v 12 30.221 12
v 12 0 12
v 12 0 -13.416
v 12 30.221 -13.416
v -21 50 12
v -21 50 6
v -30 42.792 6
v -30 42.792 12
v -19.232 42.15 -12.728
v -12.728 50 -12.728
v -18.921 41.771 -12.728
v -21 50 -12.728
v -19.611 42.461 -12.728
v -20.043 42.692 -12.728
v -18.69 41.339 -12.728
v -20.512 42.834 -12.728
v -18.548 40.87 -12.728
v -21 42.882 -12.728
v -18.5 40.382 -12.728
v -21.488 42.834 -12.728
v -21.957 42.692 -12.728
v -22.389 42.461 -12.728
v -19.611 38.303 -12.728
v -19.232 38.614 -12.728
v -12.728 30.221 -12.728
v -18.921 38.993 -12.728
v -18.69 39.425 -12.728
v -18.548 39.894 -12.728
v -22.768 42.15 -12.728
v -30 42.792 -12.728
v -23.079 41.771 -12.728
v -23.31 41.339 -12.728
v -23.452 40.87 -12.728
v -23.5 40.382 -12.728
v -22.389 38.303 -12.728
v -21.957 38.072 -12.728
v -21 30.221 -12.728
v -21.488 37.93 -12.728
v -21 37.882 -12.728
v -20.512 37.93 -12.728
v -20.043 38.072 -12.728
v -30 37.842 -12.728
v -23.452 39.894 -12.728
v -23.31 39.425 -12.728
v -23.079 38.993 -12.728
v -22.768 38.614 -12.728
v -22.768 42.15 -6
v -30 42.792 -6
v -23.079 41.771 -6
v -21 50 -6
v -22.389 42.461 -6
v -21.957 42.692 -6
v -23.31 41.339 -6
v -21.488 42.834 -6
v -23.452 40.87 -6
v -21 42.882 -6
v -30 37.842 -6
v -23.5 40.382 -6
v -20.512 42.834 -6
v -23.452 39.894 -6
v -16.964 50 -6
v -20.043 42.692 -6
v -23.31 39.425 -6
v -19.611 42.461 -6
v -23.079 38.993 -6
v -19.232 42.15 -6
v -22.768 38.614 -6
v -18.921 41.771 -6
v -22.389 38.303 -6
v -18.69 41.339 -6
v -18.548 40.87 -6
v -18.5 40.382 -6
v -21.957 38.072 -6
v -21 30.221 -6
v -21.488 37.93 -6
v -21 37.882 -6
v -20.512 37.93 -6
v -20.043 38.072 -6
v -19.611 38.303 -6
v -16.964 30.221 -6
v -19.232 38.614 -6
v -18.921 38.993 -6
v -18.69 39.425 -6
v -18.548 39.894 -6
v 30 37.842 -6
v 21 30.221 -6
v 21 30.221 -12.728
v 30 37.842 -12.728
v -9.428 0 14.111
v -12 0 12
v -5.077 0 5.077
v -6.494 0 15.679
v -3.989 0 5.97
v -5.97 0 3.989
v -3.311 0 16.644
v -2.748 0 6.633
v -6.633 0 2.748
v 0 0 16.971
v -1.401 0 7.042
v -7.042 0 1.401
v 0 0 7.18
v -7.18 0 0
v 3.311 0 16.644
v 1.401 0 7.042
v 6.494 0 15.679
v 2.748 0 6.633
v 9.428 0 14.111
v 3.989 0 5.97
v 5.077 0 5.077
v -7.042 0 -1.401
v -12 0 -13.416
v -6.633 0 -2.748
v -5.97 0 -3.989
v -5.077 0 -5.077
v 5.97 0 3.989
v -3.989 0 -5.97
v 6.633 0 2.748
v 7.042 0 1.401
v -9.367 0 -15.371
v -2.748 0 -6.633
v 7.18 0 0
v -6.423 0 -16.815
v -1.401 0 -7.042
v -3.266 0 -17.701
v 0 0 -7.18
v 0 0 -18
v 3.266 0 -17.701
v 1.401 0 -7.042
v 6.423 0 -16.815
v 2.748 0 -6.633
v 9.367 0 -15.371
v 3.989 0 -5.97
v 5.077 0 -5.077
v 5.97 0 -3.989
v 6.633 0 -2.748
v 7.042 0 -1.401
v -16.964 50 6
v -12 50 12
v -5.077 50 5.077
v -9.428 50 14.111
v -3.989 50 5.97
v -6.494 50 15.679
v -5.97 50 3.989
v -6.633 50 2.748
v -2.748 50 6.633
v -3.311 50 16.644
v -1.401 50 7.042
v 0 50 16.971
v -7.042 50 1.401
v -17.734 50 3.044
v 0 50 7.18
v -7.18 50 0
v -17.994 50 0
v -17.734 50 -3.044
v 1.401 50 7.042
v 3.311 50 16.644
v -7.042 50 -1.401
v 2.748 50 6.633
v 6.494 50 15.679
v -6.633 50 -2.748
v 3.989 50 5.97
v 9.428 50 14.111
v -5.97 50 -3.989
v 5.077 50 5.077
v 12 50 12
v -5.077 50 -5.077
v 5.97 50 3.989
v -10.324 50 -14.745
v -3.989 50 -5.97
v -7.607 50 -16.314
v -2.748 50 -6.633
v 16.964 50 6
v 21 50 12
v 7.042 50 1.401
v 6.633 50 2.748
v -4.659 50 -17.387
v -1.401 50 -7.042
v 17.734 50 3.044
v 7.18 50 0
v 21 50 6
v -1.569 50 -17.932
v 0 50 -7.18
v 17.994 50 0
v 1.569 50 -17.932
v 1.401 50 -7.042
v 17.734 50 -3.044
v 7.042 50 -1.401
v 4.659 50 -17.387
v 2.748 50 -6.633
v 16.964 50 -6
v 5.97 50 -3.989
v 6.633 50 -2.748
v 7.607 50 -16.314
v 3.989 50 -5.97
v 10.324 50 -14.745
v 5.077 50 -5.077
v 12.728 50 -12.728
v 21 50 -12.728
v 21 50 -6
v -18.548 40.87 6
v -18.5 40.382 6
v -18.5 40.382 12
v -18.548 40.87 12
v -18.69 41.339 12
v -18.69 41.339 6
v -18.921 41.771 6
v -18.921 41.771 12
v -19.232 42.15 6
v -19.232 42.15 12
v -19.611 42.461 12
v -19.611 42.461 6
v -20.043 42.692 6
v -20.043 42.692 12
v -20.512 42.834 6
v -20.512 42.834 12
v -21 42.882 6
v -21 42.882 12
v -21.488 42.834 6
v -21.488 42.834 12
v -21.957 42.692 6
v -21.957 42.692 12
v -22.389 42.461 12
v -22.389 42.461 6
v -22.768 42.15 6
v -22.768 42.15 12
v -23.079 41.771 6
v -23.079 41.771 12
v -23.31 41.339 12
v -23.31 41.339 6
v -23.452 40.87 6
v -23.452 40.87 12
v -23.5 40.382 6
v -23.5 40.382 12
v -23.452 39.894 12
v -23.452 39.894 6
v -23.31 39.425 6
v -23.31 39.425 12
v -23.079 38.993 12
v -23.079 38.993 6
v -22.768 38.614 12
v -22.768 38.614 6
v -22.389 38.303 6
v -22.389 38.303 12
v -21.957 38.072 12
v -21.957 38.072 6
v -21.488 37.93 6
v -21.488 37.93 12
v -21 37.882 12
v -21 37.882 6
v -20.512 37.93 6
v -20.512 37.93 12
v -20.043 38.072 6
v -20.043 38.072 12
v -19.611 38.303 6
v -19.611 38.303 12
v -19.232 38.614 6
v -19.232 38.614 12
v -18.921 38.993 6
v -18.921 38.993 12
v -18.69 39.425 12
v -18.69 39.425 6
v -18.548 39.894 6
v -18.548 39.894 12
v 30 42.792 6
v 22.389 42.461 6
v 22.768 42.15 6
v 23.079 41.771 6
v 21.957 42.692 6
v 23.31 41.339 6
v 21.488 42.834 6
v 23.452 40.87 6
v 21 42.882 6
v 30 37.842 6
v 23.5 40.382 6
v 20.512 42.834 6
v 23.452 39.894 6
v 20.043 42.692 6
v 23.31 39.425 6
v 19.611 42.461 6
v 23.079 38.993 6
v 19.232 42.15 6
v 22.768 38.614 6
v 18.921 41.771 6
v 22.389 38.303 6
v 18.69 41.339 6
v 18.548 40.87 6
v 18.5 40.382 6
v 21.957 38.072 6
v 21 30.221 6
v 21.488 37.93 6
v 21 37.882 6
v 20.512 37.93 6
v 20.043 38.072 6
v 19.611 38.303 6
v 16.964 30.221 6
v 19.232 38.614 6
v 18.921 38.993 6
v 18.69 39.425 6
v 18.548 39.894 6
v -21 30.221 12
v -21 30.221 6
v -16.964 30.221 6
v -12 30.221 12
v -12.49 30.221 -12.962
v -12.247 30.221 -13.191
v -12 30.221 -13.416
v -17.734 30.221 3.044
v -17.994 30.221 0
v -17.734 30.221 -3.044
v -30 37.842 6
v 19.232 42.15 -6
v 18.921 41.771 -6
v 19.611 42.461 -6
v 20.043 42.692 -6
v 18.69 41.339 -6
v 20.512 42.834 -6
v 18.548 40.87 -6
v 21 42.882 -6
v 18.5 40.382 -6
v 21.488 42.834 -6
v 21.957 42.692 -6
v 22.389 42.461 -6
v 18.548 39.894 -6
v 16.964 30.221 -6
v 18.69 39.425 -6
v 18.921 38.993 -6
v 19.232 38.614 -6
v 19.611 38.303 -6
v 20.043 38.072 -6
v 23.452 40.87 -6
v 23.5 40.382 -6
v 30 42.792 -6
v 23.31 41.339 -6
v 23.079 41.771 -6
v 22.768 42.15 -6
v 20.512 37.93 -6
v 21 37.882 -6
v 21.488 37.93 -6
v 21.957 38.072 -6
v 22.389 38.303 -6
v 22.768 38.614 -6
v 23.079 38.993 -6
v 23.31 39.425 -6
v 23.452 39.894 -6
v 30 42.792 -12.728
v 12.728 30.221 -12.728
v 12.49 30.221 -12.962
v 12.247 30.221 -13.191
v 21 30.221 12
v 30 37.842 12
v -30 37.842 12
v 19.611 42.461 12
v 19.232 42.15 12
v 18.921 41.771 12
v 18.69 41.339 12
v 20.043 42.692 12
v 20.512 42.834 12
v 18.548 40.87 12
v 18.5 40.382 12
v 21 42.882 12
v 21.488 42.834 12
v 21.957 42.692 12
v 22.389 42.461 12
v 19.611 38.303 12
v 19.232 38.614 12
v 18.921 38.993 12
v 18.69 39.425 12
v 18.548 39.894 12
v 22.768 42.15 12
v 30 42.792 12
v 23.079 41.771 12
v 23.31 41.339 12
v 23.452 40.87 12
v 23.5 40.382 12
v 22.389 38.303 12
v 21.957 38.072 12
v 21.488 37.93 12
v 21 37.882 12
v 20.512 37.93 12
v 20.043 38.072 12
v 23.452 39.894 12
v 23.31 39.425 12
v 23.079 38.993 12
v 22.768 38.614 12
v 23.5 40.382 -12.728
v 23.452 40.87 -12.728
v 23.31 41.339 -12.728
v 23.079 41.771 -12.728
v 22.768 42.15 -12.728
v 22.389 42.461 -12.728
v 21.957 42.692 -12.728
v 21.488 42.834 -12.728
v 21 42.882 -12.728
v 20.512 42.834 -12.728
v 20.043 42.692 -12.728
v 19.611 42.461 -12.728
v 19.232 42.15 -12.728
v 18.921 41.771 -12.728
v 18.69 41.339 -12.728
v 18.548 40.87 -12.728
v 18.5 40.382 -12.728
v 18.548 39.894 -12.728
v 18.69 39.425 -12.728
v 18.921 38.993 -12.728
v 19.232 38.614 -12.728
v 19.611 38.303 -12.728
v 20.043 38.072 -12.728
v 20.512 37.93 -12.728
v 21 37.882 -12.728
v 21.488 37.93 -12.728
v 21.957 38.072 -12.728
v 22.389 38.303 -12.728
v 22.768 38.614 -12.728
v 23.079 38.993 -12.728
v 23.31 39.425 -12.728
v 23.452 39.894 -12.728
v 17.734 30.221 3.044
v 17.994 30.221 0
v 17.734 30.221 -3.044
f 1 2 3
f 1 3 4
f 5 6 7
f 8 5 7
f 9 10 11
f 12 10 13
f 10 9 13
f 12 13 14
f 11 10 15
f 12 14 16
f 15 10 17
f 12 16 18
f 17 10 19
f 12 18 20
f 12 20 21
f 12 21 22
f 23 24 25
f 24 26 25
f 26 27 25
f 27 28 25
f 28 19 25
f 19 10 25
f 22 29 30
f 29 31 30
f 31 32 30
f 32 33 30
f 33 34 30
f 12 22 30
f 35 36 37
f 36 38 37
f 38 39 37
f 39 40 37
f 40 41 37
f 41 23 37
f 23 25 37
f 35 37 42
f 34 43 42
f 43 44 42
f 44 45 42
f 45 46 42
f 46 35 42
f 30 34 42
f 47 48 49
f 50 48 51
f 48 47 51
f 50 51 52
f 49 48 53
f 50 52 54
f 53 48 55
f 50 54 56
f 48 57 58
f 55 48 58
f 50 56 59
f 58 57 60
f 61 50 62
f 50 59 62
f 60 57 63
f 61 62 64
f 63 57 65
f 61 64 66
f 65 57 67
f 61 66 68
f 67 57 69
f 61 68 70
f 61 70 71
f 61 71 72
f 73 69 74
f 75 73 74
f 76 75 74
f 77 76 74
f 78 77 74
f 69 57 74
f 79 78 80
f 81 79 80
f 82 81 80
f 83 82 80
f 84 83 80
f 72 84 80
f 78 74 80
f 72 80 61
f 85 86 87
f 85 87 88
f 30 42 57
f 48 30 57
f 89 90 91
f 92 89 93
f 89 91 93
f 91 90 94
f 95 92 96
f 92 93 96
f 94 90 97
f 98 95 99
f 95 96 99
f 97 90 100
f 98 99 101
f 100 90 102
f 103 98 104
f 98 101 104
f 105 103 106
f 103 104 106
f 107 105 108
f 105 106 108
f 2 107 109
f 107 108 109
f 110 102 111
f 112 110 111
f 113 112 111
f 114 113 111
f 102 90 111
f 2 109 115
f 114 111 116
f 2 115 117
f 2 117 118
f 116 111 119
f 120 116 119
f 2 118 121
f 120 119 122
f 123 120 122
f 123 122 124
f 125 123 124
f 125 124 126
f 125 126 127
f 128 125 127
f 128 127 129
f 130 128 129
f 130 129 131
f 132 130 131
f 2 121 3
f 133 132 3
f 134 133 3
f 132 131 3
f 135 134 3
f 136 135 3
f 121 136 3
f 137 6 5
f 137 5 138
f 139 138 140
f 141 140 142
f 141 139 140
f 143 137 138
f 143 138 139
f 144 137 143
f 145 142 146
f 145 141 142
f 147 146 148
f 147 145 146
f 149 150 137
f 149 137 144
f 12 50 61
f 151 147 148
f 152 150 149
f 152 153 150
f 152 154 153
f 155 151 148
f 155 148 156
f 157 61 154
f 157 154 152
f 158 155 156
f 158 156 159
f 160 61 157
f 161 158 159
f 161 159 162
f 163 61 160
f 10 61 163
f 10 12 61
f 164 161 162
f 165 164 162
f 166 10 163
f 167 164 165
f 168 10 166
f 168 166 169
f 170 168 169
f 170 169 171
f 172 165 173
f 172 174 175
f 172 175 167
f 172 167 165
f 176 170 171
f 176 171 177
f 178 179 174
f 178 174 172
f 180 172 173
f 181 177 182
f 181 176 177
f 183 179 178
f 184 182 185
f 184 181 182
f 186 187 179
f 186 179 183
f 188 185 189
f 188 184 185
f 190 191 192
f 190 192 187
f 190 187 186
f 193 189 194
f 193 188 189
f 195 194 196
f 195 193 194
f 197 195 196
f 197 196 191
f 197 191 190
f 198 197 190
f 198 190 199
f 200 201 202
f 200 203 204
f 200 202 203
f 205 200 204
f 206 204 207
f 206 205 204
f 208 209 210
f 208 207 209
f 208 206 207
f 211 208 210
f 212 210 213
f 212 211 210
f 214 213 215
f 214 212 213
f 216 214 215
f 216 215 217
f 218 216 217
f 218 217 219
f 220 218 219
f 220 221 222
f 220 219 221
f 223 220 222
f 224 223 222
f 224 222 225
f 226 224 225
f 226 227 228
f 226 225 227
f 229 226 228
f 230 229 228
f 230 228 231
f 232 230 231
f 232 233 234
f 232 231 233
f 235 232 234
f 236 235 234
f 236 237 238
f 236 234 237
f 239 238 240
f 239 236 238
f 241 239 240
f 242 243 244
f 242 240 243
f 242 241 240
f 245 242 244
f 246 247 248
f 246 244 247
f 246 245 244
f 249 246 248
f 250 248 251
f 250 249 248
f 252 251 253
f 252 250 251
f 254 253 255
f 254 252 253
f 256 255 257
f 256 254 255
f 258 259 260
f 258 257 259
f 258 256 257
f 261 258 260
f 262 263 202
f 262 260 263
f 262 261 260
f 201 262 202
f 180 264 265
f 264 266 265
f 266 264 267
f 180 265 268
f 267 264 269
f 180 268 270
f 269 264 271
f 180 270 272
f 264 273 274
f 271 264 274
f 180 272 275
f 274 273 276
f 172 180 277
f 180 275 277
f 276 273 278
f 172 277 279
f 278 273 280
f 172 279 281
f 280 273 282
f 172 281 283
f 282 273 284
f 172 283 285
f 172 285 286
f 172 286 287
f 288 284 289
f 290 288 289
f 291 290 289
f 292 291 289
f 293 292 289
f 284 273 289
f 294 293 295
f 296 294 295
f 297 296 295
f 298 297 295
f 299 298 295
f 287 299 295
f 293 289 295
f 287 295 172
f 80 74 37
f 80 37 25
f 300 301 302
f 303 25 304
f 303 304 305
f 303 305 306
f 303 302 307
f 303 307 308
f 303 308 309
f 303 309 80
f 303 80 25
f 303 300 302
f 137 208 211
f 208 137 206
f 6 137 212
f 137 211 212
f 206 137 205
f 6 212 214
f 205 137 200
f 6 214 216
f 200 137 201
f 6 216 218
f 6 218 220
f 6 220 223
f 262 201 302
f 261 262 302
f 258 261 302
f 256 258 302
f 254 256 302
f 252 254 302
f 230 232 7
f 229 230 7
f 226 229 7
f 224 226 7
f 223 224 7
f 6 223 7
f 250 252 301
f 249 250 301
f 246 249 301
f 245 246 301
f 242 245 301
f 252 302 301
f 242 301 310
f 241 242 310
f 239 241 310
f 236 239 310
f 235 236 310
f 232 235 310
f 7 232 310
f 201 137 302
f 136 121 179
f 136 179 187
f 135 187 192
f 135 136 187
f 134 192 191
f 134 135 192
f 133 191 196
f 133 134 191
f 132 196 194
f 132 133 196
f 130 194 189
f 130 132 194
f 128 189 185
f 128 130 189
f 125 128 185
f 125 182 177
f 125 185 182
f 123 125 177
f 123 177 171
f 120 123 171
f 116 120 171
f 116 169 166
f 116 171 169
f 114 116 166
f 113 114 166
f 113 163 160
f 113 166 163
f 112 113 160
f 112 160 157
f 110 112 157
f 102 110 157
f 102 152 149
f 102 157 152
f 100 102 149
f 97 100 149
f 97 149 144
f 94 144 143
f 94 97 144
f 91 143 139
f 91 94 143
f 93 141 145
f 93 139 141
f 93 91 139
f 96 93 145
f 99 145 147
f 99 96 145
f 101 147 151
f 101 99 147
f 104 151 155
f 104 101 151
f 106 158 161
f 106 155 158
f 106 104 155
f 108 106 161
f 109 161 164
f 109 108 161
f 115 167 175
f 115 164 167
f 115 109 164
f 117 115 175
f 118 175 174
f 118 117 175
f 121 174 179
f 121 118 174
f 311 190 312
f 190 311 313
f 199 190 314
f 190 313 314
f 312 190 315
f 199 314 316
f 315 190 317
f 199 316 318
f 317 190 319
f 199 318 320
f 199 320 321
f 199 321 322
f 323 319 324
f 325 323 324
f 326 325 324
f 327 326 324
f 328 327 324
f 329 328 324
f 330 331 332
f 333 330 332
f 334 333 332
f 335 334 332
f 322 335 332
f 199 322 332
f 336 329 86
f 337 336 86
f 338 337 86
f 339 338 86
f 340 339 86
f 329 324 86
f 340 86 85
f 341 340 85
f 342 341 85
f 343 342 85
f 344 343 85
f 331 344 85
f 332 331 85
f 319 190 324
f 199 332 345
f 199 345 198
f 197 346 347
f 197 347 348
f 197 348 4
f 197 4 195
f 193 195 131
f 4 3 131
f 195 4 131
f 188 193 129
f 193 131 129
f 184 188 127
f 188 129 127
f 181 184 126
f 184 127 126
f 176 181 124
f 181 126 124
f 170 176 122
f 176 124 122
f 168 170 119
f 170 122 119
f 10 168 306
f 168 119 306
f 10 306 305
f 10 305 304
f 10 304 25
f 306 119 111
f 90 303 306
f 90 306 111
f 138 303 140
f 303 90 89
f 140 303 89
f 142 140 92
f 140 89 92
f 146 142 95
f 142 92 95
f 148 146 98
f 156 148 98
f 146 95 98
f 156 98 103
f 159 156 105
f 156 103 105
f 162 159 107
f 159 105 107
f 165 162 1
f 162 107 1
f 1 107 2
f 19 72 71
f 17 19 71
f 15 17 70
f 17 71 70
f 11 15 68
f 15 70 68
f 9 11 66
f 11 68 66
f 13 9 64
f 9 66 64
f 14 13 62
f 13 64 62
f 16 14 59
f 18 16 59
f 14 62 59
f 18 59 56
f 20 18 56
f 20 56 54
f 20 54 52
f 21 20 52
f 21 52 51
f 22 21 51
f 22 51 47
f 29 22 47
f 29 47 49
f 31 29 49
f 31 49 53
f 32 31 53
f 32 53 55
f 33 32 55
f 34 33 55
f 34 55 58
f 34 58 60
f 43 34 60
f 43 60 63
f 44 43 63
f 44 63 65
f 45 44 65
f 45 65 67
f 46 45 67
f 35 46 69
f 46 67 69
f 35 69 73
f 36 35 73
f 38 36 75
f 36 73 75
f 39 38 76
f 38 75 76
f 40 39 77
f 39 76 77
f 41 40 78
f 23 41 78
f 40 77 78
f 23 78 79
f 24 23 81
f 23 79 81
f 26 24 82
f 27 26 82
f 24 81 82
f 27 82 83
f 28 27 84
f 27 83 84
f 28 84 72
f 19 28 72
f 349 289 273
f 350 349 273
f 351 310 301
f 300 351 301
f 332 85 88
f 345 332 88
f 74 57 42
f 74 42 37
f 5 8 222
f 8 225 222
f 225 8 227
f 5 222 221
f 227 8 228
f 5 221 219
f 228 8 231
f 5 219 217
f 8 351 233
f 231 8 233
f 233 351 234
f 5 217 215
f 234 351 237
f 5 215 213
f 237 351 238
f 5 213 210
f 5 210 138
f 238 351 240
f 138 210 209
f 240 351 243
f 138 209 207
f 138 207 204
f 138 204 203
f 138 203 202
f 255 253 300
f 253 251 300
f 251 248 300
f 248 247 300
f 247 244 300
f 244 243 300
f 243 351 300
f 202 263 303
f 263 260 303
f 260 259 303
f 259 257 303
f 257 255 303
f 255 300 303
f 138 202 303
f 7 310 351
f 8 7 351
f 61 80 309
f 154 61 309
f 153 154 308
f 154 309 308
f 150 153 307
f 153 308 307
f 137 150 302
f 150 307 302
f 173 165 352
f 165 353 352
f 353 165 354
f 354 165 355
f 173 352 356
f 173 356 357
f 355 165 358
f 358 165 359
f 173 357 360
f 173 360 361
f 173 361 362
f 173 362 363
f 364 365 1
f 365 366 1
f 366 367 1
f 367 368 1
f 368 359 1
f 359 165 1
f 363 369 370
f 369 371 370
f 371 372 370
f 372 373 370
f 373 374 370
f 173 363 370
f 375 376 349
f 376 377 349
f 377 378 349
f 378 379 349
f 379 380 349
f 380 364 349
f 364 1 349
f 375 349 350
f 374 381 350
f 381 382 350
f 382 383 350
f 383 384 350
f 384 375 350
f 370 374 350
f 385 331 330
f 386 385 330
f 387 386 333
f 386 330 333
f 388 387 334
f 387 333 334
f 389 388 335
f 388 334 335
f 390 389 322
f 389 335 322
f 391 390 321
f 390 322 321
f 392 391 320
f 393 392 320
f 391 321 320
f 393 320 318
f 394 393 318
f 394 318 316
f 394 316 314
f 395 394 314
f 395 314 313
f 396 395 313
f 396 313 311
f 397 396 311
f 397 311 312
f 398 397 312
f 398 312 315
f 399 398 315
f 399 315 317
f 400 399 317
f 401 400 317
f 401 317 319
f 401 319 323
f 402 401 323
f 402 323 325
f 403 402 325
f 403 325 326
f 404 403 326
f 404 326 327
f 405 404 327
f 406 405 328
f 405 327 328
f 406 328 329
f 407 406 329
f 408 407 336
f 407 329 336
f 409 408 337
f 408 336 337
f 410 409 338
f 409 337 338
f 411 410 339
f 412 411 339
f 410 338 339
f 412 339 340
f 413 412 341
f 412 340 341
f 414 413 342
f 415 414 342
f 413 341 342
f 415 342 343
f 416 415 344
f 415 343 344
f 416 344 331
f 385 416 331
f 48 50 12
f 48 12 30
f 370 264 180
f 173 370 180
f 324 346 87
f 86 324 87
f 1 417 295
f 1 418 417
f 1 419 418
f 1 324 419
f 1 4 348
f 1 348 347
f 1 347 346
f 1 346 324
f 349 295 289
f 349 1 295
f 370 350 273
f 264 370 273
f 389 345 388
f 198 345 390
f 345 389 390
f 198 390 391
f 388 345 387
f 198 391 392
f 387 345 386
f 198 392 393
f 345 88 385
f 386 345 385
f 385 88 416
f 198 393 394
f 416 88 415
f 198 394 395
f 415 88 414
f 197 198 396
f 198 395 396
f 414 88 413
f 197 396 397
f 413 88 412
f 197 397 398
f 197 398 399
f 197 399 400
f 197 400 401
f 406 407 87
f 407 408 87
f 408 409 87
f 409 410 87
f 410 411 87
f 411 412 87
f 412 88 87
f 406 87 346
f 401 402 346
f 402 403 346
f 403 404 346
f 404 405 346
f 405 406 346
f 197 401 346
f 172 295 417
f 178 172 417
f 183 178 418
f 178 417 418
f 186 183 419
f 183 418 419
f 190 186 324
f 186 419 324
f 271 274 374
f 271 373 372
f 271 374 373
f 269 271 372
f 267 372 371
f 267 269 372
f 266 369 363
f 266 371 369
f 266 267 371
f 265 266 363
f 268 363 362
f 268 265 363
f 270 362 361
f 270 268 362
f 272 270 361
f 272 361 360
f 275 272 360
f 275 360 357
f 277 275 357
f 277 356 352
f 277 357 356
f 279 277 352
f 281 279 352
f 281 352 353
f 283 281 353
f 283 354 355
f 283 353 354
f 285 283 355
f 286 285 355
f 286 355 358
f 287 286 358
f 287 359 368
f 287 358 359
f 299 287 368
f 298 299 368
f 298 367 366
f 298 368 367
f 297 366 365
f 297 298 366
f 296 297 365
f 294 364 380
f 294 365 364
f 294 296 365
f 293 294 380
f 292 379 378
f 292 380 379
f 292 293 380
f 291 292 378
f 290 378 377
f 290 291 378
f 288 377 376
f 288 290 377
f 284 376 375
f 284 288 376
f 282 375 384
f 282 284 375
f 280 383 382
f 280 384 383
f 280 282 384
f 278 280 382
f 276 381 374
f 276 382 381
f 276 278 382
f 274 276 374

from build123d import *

# Parameters (mm, degrees)
SKETCH_1_R               = 7.179803271
EXTRUDE_1_DEPTH          = 50
SKETCH_3_OUTSIDE_W       = 79.114
SKETCH_3_OUTSIDE_H       = 69.114
SKETCH_3_OUTSIDE_R       = 2.5
CUT_EXTRUDE_1_DEPTH      = 17.970562748
CUT_EXTRUDE_1_DEPTH_BACK = 19


with BuildPart() as part:
    # Эскиз1 → Бобышка-Вытянуть1 (new body)
    with BuildSketch(Plane(origin=(0, 0, 0), x_dir=(1, 0, 0), z_dir=(0, 1, 0))):
        with BuildLine():
            Line((-30, 12.727922061), (-30, 6))
            Line((-30, 6), (-16.963843494, 6))
            ThreePointArc((-16.963843494, 6), (-17.993665165, 0), (-16.963843494, -6))
            Line((-16.963843494, -6), (-30, -6))
            Line((-30, -6), (-30, -12))
            Line((-30, -12), (-12, -12))
            ThreePointArc((-12, -12), (0, -16.970562748), (12, -12))
            Line((12, -12), (30, -12))
            Line((30, -12), (30, -6))
            Line((30, -6), (16.963843494, -6))
            ThreePointArc((16.963843494, -6), (17.993665165, 0), (16.963843494, 6))
            Line((16.963843494, 6), (30, 6))
            Line((30, 6), (30, 12.727922061))
            Line((30, 12.727922061), (12.727922061, 12.727922061))
            ThreePointArc((12.727922061, 12.727922061), (0, 18), (-12.727922061, 12.727922061))
            Line((-12.727922061, 12.727922061), (-30, 12.727922061))
        make_face()
        Circle(SKETCH_1_R, mode=Mode.SUBTRACT)
    extrude(amount=EXTRUDE_1_DEPTH)

    # Эскиз3 outside → Вырез-Вытянуть1 (cut, two sides)
    with BuildSketch(Plane.XY) as cut_extrude_1_sk:
        with Locations((0, 25)):
            Rectangle(SKETCH_3_OUTSIDE_W, SKETCH_3_OUTSIDE_H)
        Polygon((21, 50), (-21, 50), (-30, 42.791951294), (-30, 37.841695699), (-21, 30.220907479), (-12, 30.220907479), (-12, 0), (12, 0), (12, 30.220907479), (21, 30.220907479), (30, 37.841695699), (30, 42.791951294), align=None, mode=Mode.SUBTRACT)
        with Locations((-21, 40.381958439)):
            Circle(SKETCH_3_OUTSIDE_R)
        with Locations((21, 40.381958439)):
            Circle(SKETCH_3_OUTSIDE_R)
    extrude(amount=CUT_EXTRUDE_1_DEPTH, mode=Mode.SUBTRACT)
    extrude(cut_extrude_1_sk.sketch, amount=-CUT_EXTRUDE_1_DEPTH_BACK, mode=Mode.SUBTRACT)


solid = part.part
